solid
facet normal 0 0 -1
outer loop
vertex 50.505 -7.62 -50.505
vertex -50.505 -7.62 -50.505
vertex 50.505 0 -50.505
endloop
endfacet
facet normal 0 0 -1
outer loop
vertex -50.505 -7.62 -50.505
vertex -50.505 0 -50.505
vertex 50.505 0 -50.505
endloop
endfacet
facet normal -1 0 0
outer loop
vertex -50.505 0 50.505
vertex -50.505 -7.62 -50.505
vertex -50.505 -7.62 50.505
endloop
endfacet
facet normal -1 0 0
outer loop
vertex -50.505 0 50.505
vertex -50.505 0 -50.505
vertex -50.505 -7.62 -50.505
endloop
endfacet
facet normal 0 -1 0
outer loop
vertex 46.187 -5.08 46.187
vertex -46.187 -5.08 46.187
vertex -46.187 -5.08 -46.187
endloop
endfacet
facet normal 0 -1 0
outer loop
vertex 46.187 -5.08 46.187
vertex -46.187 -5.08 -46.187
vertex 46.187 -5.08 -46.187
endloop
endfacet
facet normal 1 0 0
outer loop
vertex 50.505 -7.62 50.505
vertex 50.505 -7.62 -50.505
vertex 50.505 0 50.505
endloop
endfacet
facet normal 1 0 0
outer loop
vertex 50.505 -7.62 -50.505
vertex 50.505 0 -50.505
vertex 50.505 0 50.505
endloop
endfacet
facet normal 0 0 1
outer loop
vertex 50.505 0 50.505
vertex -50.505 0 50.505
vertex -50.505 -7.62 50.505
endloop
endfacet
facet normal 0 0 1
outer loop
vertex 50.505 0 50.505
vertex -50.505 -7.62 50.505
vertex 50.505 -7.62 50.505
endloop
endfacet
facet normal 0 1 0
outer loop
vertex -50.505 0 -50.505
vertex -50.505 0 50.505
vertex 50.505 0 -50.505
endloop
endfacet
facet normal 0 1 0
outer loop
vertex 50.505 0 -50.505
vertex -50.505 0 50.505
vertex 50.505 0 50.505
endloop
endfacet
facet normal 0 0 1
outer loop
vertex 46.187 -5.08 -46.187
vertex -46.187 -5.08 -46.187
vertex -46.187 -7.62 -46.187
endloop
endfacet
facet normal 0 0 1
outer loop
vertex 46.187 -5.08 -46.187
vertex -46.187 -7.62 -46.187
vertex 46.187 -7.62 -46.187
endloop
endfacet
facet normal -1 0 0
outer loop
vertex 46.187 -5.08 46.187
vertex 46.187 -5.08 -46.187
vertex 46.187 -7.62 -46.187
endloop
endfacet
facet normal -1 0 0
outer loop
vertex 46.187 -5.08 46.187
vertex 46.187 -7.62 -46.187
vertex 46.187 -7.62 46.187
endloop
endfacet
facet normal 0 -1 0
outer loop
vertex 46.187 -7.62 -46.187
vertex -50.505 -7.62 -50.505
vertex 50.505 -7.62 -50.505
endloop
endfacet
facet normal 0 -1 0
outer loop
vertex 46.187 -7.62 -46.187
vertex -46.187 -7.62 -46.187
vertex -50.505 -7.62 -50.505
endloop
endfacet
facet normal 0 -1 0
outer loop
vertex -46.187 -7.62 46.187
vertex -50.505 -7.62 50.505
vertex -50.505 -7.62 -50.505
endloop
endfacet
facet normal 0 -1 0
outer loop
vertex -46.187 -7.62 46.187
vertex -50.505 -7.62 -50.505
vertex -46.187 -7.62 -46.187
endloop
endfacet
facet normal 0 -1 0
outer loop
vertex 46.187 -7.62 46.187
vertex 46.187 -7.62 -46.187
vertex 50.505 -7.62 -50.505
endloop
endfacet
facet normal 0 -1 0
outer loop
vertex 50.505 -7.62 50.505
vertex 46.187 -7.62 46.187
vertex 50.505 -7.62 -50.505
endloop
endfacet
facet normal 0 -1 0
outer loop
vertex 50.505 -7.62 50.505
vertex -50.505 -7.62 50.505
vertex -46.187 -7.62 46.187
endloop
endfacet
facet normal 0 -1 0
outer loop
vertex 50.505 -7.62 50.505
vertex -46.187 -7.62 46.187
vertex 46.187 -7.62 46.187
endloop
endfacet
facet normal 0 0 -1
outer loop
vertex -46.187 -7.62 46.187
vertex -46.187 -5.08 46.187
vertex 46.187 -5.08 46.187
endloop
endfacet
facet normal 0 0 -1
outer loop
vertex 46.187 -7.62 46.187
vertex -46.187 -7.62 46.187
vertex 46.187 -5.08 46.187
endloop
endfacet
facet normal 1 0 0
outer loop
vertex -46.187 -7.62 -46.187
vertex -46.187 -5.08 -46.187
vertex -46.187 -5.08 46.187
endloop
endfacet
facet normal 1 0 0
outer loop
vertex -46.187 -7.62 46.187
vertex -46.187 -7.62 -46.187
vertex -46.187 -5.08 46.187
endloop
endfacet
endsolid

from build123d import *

# Parameters (mm, degrees)
F0_W     = 101.0093018413
F0_H     = 101.0093018413
F1_DEPTH = 5.08
F2_W     = 101.0093018413
F2_H     = 101.0093018413
F2_W_2   = 92.3733018413
F2_H_2   = 92.3733018413
F3_DEPTH = 2.54


# Not quite as in the source:
# - the program builds the solid bodies; features that only make, move or delete a surface that nothing else refers to are left out


with BuildPart() as f1:
    # F0 (on Front) → F1 (new body)
    with BuildSketch(Plane.XZ):
        Rectangle(F0_W, F0_H)
    extrude(amount=F1_DEPTH)

    # F2 (on face) → F3 (join)
    with BuildSketch(Plane.XZ.offset(5.08)):
        Rectangle(F2_W, F2_H)
        Rectangle(F2_W_2, F2_H_2, mode=Mode.SUBTRACT)
    extrude(amount=F3_DEPTH)


solid = f1.part
